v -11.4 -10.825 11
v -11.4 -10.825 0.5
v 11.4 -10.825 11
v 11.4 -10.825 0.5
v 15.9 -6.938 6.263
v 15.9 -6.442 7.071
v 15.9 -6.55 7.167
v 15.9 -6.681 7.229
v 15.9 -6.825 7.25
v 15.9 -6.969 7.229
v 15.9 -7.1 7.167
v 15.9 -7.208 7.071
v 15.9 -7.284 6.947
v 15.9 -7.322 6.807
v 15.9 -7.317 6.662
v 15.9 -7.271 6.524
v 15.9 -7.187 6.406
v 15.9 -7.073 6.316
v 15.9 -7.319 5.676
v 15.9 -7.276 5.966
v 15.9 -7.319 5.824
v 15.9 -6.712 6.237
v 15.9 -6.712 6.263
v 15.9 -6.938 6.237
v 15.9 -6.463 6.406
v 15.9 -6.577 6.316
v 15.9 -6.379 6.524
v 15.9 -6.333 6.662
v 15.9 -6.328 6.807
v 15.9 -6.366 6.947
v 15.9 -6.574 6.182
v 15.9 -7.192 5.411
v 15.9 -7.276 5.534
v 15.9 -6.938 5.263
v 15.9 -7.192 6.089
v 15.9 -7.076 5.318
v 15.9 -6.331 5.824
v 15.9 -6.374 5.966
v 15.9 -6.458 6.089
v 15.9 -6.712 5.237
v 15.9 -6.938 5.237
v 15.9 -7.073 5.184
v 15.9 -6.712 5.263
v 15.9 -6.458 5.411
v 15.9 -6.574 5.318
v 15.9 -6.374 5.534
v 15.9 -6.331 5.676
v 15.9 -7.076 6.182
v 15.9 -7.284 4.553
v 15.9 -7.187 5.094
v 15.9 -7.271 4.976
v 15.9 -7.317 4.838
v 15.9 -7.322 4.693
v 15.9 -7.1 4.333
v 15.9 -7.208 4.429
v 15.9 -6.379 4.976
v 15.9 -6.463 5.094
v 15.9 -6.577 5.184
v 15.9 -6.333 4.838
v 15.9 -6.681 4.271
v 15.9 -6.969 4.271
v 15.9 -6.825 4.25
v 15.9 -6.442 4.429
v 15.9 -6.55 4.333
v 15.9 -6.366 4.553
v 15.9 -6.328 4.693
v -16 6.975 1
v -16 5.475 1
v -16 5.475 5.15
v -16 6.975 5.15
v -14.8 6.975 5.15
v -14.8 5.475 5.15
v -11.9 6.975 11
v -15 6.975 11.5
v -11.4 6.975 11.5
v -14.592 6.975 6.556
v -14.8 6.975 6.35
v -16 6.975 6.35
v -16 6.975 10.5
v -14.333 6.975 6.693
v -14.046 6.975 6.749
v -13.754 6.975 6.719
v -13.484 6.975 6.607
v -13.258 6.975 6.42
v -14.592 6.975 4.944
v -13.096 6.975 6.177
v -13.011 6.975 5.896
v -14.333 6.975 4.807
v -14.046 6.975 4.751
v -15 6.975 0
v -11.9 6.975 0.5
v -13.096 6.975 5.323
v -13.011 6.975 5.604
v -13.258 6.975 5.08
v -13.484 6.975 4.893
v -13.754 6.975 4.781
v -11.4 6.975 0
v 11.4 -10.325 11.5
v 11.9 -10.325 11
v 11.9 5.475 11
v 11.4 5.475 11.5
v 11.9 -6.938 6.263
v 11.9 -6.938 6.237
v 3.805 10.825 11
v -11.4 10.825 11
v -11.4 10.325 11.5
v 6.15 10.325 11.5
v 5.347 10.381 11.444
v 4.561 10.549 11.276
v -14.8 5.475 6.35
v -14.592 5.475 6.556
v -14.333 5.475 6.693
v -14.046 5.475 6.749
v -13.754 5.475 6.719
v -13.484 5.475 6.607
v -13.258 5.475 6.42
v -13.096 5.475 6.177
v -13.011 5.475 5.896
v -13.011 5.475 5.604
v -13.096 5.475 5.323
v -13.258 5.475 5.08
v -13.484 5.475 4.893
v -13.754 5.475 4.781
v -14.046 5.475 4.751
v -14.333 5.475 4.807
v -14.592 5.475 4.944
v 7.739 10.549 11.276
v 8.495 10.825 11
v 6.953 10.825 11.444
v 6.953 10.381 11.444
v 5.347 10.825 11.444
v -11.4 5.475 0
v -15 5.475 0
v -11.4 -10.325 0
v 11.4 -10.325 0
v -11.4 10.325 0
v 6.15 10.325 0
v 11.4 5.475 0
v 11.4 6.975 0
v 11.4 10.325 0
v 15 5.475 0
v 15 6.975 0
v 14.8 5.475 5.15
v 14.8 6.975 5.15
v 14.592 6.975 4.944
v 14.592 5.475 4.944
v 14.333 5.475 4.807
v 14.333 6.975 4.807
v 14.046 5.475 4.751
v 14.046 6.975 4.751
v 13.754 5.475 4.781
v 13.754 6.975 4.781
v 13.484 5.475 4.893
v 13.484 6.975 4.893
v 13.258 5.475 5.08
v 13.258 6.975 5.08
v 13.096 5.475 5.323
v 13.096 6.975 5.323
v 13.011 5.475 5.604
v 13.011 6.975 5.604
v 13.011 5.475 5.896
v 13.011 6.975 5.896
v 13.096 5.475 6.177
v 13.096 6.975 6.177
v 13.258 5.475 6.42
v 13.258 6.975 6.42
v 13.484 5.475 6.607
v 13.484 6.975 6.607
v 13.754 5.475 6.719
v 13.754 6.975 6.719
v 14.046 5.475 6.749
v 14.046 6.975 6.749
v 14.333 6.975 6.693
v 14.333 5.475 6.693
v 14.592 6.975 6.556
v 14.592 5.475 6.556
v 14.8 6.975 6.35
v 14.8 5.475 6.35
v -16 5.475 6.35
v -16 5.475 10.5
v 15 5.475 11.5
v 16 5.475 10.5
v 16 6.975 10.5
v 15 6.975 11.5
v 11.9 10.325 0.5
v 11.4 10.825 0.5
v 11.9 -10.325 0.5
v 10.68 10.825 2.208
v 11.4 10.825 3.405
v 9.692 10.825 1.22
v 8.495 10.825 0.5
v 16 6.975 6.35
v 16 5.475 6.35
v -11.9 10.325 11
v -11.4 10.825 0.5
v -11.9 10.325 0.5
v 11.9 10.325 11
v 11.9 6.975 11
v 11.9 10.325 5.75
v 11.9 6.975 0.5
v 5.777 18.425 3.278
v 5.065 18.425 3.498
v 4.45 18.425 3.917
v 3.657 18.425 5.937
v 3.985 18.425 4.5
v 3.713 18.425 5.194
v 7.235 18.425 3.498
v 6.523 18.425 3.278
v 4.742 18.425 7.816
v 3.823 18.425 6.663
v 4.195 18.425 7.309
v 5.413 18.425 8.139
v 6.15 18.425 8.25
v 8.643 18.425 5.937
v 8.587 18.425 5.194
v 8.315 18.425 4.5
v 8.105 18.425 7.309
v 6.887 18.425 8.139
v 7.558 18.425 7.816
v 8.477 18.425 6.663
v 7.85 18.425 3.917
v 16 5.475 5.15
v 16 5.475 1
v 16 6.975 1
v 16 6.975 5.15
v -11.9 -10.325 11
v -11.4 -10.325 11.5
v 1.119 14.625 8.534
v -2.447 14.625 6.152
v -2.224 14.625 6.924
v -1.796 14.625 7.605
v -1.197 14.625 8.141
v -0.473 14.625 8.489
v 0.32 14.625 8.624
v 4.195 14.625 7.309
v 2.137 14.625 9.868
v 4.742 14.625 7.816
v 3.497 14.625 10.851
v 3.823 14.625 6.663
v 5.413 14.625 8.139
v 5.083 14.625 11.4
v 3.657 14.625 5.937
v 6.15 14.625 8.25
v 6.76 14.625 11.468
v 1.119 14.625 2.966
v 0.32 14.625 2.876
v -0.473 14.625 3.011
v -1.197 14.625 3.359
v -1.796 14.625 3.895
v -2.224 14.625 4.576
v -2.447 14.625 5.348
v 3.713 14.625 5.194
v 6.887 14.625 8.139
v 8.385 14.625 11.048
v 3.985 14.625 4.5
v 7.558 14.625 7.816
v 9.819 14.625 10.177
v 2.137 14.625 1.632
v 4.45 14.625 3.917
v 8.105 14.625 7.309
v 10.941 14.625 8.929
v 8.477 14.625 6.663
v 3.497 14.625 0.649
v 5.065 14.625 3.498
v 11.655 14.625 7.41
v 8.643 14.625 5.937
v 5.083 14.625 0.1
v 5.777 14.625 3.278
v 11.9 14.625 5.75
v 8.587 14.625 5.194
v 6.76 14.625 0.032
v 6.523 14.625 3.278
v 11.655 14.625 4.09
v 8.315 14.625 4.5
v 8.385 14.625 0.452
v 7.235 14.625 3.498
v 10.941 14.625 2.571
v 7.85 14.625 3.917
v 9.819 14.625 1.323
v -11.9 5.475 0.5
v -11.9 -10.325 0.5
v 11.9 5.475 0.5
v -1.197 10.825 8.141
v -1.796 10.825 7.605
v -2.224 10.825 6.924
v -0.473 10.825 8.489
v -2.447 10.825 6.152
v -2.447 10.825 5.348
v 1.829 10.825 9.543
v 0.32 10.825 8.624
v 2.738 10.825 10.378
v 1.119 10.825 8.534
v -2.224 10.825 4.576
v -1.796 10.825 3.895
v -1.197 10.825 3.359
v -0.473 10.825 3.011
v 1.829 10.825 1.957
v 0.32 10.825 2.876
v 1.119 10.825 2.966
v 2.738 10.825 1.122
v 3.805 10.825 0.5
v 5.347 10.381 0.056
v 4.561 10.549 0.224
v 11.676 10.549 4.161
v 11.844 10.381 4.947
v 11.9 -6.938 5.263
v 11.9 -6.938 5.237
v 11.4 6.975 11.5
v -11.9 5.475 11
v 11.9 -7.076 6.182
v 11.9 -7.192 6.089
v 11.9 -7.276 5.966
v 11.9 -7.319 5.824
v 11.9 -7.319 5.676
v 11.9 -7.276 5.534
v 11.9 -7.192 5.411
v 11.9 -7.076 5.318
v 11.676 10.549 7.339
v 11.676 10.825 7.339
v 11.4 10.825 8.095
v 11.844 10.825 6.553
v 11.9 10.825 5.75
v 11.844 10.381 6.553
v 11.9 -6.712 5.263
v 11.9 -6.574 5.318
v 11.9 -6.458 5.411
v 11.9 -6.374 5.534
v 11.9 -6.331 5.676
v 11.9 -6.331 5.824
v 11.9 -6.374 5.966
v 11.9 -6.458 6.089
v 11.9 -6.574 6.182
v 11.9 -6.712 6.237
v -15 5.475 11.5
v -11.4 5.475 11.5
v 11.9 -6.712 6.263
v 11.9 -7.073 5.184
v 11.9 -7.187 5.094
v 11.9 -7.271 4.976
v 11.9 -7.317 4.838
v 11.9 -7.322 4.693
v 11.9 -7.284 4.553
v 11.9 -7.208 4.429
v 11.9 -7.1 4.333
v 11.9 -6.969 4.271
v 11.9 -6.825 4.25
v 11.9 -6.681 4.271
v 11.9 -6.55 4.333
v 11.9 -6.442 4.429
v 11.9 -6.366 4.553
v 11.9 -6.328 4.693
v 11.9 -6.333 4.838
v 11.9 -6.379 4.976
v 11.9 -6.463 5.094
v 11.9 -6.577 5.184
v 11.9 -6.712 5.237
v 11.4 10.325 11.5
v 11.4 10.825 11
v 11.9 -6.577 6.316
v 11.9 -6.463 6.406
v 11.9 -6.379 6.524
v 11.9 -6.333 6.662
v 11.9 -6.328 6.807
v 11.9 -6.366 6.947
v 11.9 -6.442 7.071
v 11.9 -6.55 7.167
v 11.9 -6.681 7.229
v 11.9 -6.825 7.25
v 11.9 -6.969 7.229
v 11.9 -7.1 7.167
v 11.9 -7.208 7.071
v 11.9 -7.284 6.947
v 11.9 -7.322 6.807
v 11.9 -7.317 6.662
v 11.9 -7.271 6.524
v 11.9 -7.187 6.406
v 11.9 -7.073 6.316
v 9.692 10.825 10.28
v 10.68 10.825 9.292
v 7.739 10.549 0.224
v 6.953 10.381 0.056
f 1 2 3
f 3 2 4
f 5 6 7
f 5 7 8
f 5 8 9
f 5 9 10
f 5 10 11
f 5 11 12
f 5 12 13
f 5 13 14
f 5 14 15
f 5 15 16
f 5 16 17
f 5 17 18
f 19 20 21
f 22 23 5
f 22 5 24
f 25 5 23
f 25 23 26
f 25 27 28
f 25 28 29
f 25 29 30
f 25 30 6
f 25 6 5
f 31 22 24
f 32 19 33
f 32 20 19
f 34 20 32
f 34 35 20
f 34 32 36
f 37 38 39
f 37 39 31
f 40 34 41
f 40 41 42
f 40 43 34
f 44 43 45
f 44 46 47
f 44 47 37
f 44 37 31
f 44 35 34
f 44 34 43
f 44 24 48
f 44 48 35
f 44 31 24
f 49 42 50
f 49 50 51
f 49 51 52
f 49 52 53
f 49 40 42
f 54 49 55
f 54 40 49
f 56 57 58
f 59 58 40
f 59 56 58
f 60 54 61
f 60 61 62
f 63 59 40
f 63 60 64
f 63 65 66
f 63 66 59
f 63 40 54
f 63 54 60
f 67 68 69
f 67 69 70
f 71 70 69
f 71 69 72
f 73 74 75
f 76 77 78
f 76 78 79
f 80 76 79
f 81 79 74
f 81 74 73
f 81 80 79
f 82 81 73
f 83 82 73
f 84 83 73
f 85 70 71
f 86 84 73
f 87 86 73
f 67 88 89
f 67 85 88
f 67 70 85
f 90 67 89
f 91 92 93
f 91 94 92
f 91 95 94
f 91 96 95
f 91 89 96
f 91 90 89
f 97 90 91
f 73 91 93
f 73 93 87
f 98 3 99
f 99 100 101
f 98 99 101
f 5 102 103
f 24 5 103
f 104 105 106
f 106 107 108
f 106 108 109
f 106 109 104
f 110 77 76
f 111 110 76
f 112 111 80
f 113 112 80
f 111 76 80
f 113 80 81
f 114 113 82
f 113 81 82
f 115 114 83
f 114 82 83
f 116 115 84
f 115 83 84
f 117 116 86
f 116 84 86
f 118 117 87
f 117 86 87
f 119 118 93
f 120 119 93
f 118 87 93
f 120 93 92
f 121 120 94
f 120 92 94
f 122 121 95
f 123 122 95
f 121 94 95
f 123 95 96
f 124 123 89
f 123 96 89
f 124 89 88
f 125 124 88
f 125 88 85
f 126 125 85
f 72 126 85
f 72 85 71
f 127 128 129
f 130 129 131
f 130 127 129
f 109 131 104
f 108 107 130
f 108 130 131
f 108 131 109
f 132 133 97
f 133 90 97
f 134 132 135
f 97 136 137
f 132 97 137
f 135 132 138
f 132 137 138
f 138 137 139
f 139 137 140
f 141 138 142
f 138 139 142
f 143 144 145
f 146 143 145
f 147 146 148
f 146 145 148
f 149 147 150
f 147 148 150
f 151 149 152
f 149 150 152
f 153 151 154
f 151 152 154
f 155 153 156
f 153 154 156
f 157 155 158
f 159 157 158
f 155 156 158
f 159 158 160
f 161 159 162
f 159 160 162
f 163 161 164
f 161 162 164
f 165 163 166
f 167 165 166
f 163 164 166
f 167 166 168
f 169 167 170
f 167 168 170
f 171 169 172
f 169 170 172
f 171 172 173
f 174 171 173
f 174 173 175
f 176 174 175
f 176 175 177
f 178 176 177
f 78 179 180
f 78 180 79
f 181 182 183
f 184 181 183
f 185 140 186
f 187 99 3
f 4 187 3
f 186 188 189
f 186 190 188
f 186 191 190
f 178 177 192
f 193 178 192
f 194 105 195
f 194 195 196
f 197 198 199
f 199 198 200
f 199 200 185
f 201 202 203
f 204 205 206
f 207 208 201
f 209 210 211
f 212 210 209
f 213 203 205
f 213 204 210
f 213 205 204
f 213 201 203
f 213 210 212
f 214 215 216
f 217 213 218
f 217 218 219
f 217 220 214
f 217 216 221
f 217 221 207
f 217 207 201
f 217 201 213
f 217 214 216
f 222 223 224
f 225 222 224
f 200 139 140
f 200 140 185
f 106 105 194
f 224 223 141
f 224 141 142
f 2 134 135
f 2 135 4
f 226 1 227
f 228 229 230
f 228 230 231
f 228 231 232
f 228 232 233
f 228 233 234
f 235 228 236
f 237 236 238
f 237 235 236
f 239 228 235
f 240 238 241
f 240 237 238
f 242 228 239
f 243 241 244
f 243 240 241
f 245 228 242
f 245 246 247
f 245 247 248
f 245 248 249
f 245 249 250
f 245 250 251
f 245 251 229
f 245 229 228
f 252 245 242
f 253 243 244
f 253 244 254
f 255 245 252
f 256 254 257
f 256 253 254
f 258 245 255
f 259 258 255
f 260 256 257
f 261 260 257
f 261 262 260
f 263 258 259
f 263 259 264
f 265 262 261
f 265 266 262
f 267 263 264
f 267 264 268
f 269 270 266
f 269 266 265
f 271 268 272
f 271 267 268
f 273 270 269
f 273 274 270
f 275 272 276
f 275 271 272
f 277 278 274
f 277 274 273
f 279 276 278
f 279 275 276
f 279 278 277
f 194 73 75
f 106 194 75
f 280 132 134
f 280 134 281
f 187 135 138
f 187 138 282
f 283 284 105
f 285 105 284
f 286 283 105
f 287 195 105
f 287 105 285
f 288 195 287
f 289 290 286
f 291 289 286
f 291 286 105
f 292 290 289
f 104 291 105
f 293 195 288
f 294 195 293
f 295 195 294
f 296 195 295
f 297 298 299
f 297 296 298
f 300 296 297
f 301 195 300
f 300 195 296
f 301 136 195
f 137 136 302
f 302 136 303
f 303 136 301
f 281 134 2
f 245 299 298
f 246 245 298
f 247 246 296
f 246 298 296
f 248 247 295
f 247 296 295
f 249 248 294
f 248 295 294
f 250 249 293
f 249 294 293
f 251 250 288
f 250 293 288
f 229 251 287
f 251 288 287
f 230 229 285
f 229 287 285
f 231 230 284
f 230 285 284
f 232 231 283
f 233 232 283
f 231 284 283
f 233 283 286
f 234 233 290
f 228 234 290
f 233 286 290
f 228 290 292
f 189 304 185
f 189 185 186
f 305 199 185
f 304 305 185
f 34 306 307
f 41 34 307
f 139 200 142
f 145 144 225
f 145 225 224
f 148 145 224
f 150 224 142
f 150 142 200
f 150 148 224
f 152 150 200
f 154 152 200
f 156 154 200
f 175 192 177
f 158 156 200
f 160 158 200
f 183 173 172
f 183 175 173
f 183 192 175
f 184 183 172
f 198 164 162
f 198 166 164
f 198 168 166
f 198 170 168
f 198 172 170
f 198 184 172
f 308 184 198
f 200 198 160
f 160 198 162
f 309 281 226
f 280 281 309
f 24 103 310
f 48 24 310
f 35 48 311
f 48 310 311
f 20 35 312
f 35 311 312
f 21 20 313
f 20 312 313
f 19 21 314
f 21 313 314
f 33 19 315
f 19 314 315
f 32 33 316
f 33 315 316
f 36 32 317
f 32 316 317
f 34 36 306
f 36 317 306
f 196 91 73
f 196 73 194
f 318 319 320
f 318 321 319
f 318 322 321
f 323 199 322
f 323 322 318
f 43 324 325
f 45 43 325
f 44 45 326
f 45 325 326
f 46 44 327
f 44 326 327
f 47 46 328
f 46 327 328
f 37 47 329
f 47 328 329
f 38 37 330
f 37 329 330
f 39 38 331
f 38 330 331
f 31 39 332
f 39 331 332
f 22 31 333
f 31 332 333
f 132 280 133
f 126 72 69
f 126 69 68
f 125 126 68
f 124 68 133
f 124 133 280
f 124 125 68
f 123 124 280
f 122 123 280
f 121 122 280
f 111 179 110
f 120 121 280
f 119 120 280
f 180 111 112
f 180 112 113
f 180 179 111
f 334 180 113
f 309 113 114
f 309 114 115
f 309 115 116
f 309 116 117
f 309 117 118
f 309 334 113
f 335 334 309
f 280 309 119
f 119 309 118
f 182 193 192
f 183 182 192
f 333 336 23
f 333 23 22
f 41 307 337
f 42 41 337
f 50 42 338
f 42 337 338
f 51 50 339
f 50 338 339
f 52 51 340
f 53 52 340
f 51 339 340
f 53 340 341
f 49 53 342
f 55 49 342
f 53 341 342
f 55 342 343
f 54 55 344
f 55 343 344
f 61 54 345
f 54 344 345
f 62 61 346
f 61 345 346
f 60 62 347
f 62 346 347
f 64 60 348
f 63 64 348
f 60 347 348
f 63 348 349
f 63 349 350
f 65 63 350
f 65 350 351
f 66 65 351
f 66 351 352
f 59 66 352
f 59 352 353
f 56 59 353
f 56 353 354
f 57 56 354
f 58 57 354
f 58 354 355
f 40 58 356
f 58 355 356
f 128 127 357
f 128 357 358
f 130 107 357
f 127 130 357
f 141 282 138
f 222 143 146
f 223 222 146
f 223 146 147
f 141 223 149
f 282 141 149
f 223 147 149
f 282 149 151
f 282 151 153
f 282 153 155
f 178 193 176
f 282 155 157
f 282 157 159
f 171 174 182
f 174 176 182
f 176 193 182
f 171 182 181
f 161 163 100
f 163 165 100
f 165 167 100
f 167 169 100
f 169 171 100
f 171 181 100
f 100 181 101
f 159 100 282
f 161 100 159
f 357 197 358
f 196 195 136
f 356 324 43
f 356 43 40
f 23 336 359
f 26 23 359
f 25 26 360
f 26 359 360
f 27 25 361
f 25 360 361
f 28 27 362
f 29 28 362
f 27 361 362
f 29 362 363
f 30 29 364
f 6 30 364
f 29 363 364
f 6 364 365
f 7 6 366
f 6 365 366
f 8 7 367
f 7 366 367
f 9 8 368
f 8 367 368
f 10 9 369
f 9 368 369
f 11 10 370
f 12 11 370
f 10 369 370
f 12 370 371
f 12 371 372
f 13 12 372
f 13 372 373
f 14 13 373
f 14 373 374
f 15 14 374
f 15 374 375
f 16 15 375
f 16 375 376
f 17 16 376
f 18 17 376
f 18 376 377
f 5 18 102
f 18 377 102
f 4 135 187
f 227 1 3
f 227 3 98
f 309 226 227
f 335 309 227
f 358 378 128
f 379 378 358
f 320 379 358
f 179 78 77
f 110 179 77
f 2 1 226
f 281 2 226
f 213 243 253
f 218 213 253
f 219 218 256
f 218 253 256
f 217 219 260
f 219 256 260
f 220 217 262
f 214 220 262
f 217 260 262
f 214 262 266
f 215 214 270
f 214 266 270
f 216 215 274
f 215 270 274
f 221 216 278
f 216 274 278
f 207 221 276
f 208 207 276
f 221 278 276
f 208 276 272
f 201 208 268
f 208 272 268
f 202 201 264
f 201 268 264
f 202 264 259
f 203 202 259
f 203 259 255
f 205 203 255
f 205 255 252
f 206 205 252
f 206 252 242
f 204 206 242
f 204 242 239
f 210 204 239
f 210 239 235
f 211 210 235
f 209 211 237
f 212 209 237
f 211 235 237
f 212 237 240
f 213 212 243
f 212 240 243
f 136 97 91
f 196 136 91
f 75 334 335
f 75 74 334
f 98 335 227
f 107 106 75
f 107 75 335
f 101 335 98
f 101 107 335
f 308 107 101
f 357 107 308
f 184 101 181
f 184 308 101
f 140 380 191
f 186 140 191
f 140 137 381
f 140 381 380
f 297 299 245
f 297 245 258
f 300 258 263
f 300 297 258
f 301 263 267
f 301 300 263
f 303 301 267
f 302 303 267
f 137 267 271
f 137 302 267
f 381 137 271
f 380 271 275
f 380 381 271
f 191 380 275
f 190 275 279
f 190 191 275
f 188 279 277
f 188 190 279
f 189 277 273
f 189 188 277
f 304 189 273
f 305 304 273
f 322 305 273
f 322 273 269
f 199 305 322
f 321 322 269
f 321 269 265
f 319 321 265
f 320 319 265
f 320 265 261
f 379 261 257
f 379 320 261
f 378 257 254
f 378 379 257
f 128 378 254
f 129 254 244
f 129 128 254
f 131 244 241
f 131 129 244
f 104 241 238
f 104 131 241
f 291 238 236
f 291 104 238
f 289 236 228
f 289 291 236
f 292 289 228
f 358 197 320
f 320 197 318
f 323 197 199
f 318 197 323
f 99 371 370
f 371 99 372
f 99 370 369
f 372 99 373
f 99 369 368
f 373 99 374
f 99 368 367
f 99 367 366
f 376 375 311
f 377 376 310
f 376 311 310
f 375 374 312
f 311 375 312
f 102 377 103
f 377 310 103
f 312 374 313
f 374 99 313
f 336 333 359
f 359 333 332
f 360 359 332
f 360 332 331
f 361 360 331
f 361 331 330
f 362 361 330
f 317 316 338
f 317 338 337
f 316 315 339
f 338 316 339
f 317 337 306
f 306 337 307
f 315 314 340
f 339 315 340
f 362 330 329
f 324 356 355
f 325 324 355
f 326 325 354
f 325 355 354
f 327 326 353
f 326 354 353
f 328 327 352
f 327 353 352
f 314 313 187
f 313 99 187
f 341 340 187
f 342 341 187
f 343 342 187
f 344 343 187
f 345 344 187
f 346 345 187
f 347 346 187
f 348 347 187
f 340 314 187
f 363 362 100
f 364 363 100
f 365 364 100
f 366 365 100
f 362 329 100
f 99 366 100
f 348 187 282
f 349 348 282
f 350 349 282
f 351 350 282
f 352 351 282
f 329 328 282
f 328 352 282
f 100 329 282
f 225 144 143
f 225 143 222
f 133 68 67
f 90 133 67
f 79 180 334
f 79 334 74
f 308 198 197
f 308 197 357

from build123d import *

# Parameters (mm, degrees)
SKETCH_1_W          = 23.8
SKETCH_1_H          = 21.65
SKETCH_1_W_2        = 32
SKETCH_1_H_2        = 1.5
EXTRUDE_1_DEPTH     = 11.5
SKETCH_2_R          = 1
SKETCH_2_W          = 1.2
SKETCH_2_H          = 1.2
CUT_EXTRUDE_1_DEPTH = 11.5
SKETCH_3_R          = 5.75
SKETCH_3_R_2        = 2.875
EXTRUDE_2_DEPTH     = 3.8
SKETCH_4_R          = 2.5
EXTRUDE_3_DEPTH     = 3.8
CHAMFER_1_SIZE      = 1
CHAMFER_2_SIZE      = 0.5
SKETCH_5_R          = 0.5
SKETCH_5_W          = 1.377901166
SKETCH_5_H          = 0.226119028
EXTRUDE_5_DEPTH     = 4


with BuildPart() as part:
    # Эскиз1 → Бобышка-Вытянуть1 (new body)
    with BuildSketch(Plane.XY):
        Rectangle(SKETCH_1_W, SKETCH_1_H)
        with Locations((0, 6.225)):
            Rectangle(SKETCH_1_W_2, SKETCH_1_H_2)
    extrude(amount=EXTRUDE_1_DEPTH)

    # Эскиз2 → Вырез-Вытянуть1 (cut)
    with BuildSketch(Plane(origin=(0, 6.975, 0), x_dir=(1, 0, 0), z_dir=(0, 1, 0))):
        with Locations((-14, -5.75)):
            Circle(SKETCH_2_R)
        with Locations((14, -5.75)):
            Circle(SKETCH_2_R)
        with Locations((-15.4, -5.75)):
            Rectangle(SKETCH_2_W, SKETCH_2_H)
        with Locations((15.4, -5.75)):
            Rectangle(SKETCH_2_W, SKETCH_2_H)
    extrude(amount=-CUT_EXTRUDE_1_DEPTH, mode=Mode.SUBTRACT)

    # Эскиз3 → Бобышка-Вытянуть2 (add)
    with BuildSketch(Plane(origin=(0, 10.825, 0), x_dir=(1, 0, 0), z_dir=(0, 1, 0))):
        with Locations((6.15, -5.75)):
            Circle(SKETCH_3_R)
        with Locations((0.4, -5.75)):
            Circle(SKETCH_3_R_2)
    extrude(amount=EXTRUDE_2_DEPTH)

    # Эскиз4 → Бобышка-Вытянуть3 (add)
    with BuildSketch(Plane(origin=(0, 14.625, 0), x_dir=(1, 0, 0), z_dir=(0, 1, 0))):
        with Locations(Location((6.15, -5.75, 0), (0, 0, 270))):
            Circle(SKETCH_4_R)
    extrude(amount=EXTRUDE_3_DEPTH)

    # Фаска1
    chamfer_1_edges = [part.edges().sort_by_distance(p)[0] for p in [
        (-16, 6.225, 11.5),
        (-16, 6.225, 0),
        (16, 6.225, 0),
        (16, 6.225, 11.5),
    ]]
    chamfer(chamfer_1_edges, length=CHAMFER_1_SIZE)

    # Фаска2
    # the kernel refuses this chamfer: 0.5 mm, written as the material it takes off along each edge
    with BuildSketch(Plane(origin=(11.566666667, -10.491666667, 0.333333333), x_dir=(0.7071067811865476, 0, 0.7071067811865475), z_dir=(0.5773502691896257, -0.5773502691896258, -0.5773502691896258)), Plane(origin=(-11.566666667, 10.491666667, 11.166666667), x_dir=(-0.7071067811865475, -0.7071067811865475, 0), z_dir=(-0.5773502691896258, 0.5773502691896258, 0.5773502691896258)), Plane(origin=(-11.566666667, -10.491666667, 0.333333333), x_dir=(0, -0.7071067811865476, 0.7071067811865475), z_dir=(-0.5773502691896257, -0.5773502691896257, -0.5773502691896258)), Plane(origin=(11.566666667, 10.491666667, 0.333333333), x_dir=(0, 0.7071067811865476, 0.7071067811865475), z_dir=(0.5773502691896257, 0.5773502691896257, -0.5773502691896258))) as chamfer_2_piece_1:
        Polygon((-0.353553391, -0.204124145), (0.353553391, -0.204124145), (0, 0.40824829), align=None)
    extrude(amount=0.635085296, mode=Mode.SUBTRACT)
    with BuildSketch(Plane(origin=(11.566666667, -10.491666667, 11.166666667), x_dir=(-0.7071067811865475, -0.7071067811865475, 0), z_dir=(0.5773502691896258, -0.5773502691896258, 0.5773502691896258)), Plane(origin=(11.566666667, 10.491666667, 11.166666667), x_dir=(0.7071067811865475, -0.7071067811865475, 0), z_dir=(0.5773502691896258, 0.5773502691896258, 0.5773502691896258)), Plane(origin=(-11.566666667, 10.491666667, 0.333333333), x_dir=(0, 0.7071067811865476, 0.7071067811865475), z_dir=(-0.5773502691896257, 0.5773502691896257, -0.5773502691896258)), Plane(origin=(-11.566666667, -10.491666667, 11.166666667), x_dir=(0, -0.7071067811865475, -0.7071067811865475), z_dir=(-0.5773502691896258, -0.5773502691896258, 0.5773502691896258))) as chamfer_2_piece_2:
        Polygon((-0.353553391, 0.204124145), (0.353553391, 0.204124145), (0, -0.40824829), align=None)
    extrude(amount=0.635085296, mode=Mode.SUBTRACT)
    with BuildSketch(Plane(origin=(11.9, -10.825, -1.285841494), x_dir=(0.027495876610585647, 0.9996219169112968, 0), z_dir=(0, 0, 1)), Plane(origin=(-11.9, -10.825, -1.285841494), x_dir=(0.9996219169112968, -0.027495876610585647, 0), z_dir=(0, 0, 1))) as chamfer_2_piece_3:
        Polygon((CHAMFER_2_SIZE * 0.999621916911, CHAMFER_2_SIZE * 0.0274958766106), (-CHAMFER_2_SIZE * 0.0274958766106, CHAMFER_2_SIZE * 0.999621916911), (0, 0), align=None)
    extrude(amount=14.071682988, mode=Mode.SUBTRACT)
    with BuildSketch(Plane(origin=(11.9, 10.825, 5.75), x_dir=(0.027495876610585647, -0.9996219169112968, 0), z_dir=(0, 0, 1))) as chamfer_2_piece_4_section:
        Polygon((CHAMFER_2_SIZE * 0.999621916911, -CHAMFER_2_SIZE * 0.0274958766106), (-CHAMFER_2_SIZE * 0.0274958766106, -CHAMFER_2_SIZE * 0.999621916911), (0, 0), align=None)
    chamfer_2_piece_4 = extrude(amount=7.035841494, mode=Mode.PRIVATE)
    chamfer_2_piece_4 = chamfer_2_piece_4 - Plane(origin=(6.15, 10.65169011, 5.75), x_dir=(1, 0, 0), z_dir=(0, -1, 0)) * Cylinder(5.75, 17, mode=Mode.PRIVATE)
    add(chamfer_2_piece_4, mode=Mode.SUBTRACT)
    with BuildSketch(Plane(origin=(-11.9, 10.825, -1.285841494), x_dir=(0.9996219169112968, 0.027495876610585647, 0), z_dir=(0, 0, 1))) as chamfer_2_piece_5:
        Polygon((CHAMFER_2_SIZE * 0.999621916911, -CHAMFER_2_SIZE * 0.0274958766106), (-CHAMFER_2_SIZE * 0.0274958766106, -CHAMFER_2_SIZE * 0.999621916911), (0, 0), align=None)
    extrude(amount=14.071682988, mode=Mode.SUBTRACT)
    with BuildSketch(Plane(origin=(-11.9, 5.475, 11.5), x_dir=(-0.027495876610585647, 0, -0.9996219169112968), z_dir=(0, -1, 0)), Plane(origin=(11.9, -12.110841494, 11.5), x_dir=(0.027495876610585647, 0, -0.9996219169112968), z_dir=(0, 1, 0)), Plane(origin=(-11.9, 5.475, 0), x_dir=(0.9996219169112968, 0, -0.02749587661058639), z_dir=(0, -1, 0)), Plane(origin=(11.9, -12.110841494, 0), x_dir=(-0.9996219169112968, 0, -0.02749587661058639), z_dir=(0, 1, 0))) as chamfer_2_piece_6:
        Polygon((CHAMFER_2_SIZE * 0.999621916911, CHAMFER_2_SIZE * 0.0274958766106), (-CHAMFER_2_SIZE * 0.0274958766106, CHAMFER_2_SIZE * 0.999621916911), (0, 0), align=None)
    extrude(amount=17.585841494, mode=Mode.SUBTRACT)
    with BuildSketch(Plane(origin=(-11.9, 12.110841494, 11.5), x_dir=(-0.027495876610585647, 0, -0.9996219169112968), z_dir=(0, -1, 0)), Plane(origin=(11.9, 6.975, 11.5), x_dir=(0.027495876610585647, 0, -0.9996219169112968), z_dir=(0, 1, 0)), Plane(origin=(-11.9, 12.110841494, 0), x_dir=(0.9996219169112968, 0, -0.02749587661058639), z_dir=(0, -1, 0)), Plane(origin=(11.9, 6.975, 0), x_dir=(-0.9996219169112968, 0, -0.02749587661058639), z_dir=(0, 1, 0))) as chamfer_2_piece_7:
        Polygon((CHAMFER_2_SIZE * 0.999621916911, CHAMFER_2_SIZE * 0.0274958766106), (-CHAMFER_2_SIZE * 0.0274958766106, CHAMFER_2_SIZE * 0.999621916911), (0, 0), align=None)
    extrude(amount=5.135841494, mode=Mode.SUBTRACT)
    with BuildSketch(Plane(origin=(6.15, 10.825, 11.5), x_dir=(0, 0.027495876610585647, -0.9996219169112968), z_dir=(-1, 0, 0))) as chamfer_2_piece_8_section:
        Polygon((CHAMFER_2_SIZE * 0.999621916911, CHAMFER_2_SIZE * 0.0274958766106), (-CHAMFER_2_SIZE * 0.0274958766106, CHAMFER_2_SIZE * 0.999621916911), (0, 0), align=None)
    chamfer_2_piece_8 = extrude(amount=19.335841494, mode=Mode.PRIVATE)
    chamfer_2_piece_8 = chamfer_2_piece_8 - Plane(origin=(6.15, 10.656558796, 5.75), x_dir=(1, 0, 0), z_dir=(0, -1, 0)) * Cylinder(5.75, 41, mode=Mode.PRIVATE)
    add(chamfer_2_piece_8, mode=Mode.SUBTRACT)
    with BuildSketch(Plane(origin=(-13.185841494, -10.825, 11.5), x_dir=(0, -0.027495876610585647, -0.9996219169112968), z_dir=(1, 0, 0)), Plane(origin=(-13.185841494, -10.825, 0), x_dir=(0, 0.9996219169112968, -0.02749587661058639), z_dir=(1, 0, 0))) as chamfer_2_piece_9:
        Polygon((CHAMFER_2_SIZE * 0.999621916911, CHAMFER_2_SIZE * 0.0274958766106), (-CHAMFER_2_SIZE * 0.0274958766106, CHAMFER_2_SIZE * 0.999621916911), (0, 0), align=None)
    extrude(amount=26.371682988, mode=Mode.SUBTRACT)
    with BuildSketch(Plane(origin=(6.150000032, 10.825, 0), x_dir=(0, -0.9996219169112968, -0.02749587661058639), z_dir=(-1, 0, 0))) as chamfer_2_piece_10_section:
        Polygon((CHAMFER_2_SIZE * 0.999621916911, CHAMFER_2_SIZE * 0.0274958766106), (-CHAMFER_2_SIZE * 0.0274958766106, CHAMFER_2_SIZE * 0.999621916911), (0, 0), align=None)
    chamfer_2_piece_10 = extrude(amount=19.335841526, mode=Mode.PRIVATE)
    chamfer_2_piece_10 = chamfer_2_piece_10 - Plane(origin=(6.15, 10.656558796, 5.75), x_dir=(1, 0, 0), z_dir=(0, -1, 0)) * Cylinder(5.75, 41, mode=Mode.PRIVATE)
    add(chamfer_2_piece_10, mode=Mode.SUBTRACT)
    with BuildSketch(Plane(origin=(13.185841494, 10.825, 0), x_dir=(0, -0.9996219169112968, -0.02749587661058639), z_dir=(-1, 0, 0))) as chamfer_2_piece_11_section:
        Polygon((CHAMFER_2_SIZE * 0.999621916911, CHAMFER_2_SIZE * 0.0274958766106), (-CHAMFER_2_SIZE * 0.0274958766106, CHAMFER_2_SIZE * 0.999621916911), (0, 0), align=None)
    chamfer_2_piece_11 = extrude(amount=7.035841462, mode=Mode.PRIVATE)
    chamfer_2_piece_11 = chamfer_2_piece_11 - Plane(origin=(6.15, 10.65169011, 5.75), x_dir=(1, 0, 0), z_dir=(0, -1, 0)) * Cylinder(5.75, 17, mode=Mode.PRIVATE)
    add(chamfer_2_piece_11, mode=Mode.SUBTRACT)
    with BuildSketch(Plane(origin=(13.185841494, 10.825, 11.5), x_dir=(0, -0.9996219169112968, 0.027495876610585647), z_dir=(-1, 0, 0))) as chamfer_2_piece_12_section:
        Polygon((CHAMFER_2_SIZE * 0.999621916911, -CHAMFER_2_SIZE * 0.0274958766106), (-CHAMFER_2_SIZE * 0.0274958766106, -CHAMFER_2_SIZE * 0.999621916911), (0, 0), align=None)
    chamfer_2_piece_12 = extrude(amount=7.035841494, mode=Mode.PRIVATE)
    chamfer_2_piece_12 = chamfer_2_piece_12 - Plane(origin=(6.15, 10.65169011, 5.75), x_dir=(1, 0, 0), z_dir=(0, -1, 0)) * Cylinder(5.75, 17, mode=Mode.PRIVATE)
    add(chamfer_2_piece_12, mode=Mode.SUBTRACT)
    with BuildSketch(Plane(origin=(11.9, 10.825, -1.285841494), x_dir=(0.027495876610585647, -0.9996219169112968, 0), z_dir=(0, 0, 1))) as chamfer_2_piece_13_section:
        Polygon((CHAMFER_2_SIZE * 0.999621916911, -CHAMFER_2_SIZE * 0.0274958766106), (-CHAMFER_2_SIZE * 0.0274958766106, -CHAMFER_2_SIZE * 0.999621916911), (0, 0), align=None)
    chamfer_2_piece_13 = extrude(amount=7.035841494, mode=Mode.PRIVATE)
    chamfer_2_piece_13 = chamfer_2_piece_13 - Plane(origin=(6.15, 10.65169011, 5.75), x_dir=(1, 0, 0), z_dir=(0, -1, 0)) * Cylinder(5.75, 17, mode=Mode.PRIVATE)
    add(chamfer_2_piece_13, mode=Mode.SUBTRACT)

    # Эскиз5 → Бобышка-Вытянуть5 (add)
    with BuildSketch(Plane(origin=(11.9, 0, 0), x_dir=(0, 0, -1), z_dir=(1, 0, 0))):
        with Locations((-5.75, -6.825)):
            Circle(SKETCH_5_R)
        with Locations((-4.75, -6.825)):
            Circle(SKETCH_5_R)
        with Locations((-6.75, -6.825)):
            Circle(SKETCH_5_R)
        with Locations((-5.75, -6.825)):
            Rectangle(SKETCH_5_W, SKETCH_5_H)
    extrude(amount=EXTRUDE_5_DEPTH)


solid = part.part
